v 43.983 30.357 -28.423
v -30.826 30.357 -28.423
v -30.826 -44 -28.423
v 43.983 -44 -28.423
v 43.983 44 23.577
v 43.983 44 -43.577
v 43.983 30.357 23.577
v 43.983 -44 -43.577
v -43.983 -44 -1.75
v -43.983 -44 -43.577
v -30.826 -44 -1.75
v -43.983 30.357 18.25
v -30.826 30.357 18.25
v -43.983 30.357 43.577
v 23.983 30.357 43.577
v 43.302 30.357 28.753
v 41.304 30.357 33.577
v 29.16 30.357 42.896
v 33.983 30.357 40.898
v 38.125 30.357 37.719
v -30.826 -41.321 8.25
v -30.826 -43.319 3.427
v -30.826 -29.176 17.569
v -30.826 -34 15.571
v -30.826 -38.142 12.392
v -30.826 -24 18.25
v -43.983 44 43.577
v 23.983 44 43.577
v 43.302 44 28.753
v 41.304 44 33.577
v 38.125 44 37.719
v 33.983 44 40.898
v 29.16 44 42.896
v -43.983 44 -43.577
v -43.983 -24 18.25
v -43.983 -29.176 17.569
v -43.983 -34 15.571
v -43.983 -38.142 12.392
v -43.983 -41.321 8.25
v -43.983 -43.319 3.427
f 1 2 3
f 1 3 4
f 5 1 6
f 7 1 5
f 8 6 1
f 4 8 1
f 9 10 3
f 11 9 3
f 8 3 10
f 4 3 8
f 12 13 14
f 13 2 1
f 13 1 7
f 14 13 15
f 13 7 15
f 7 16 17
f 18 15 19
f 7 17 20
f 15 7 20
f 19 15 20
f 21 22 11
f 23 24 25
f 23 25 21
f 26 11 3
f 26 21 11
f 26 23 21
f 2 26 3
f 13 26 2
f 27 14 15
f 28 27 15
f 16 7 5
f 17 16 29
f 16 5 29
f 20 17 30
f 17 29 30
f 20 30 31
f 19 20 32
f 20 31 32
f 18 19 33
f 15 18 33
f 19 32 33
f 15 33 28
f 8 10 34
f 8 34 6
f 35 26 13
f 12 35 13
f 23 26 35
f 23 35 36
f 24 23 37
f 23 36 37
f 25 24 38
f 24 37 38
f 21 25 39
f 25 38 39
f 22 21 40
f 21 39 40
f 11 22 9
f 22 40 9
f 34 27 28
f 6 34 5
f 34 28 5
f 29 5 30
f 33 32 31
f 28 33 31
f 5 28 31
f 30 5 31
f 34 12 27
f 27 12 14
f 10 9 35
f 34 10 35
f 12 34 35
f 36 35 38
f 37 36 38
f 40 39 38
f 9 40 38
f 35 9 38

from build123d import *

# Parameters (mm, degrees)
F0_W     = 87.9665389657
F0_H     = 87.1540307999
F1_DEPTH = 44
F2_W     = 74.8088378459
F2_H     = 74.356541276
F3_DEPTH = 72
F4_W     = 74.356541276
F4_H     = 25.3268238157
F5_DEPTH = 13.1587011198
F6_R     = 20


with BuildPart() as f1:
    # F0 (on Front) → F1 (new body, symmetric)
    with BuildSketch(Plane.XZ):
        Rectangle(F0_W, F0_H)
    extrude(amount=F1_DEPTH, both=True)

    # F2 (on face) → F3 (cut)
    with BuildSketch(Plane.XY.offset(43.5770153999)):
        with Locations((6.5788505599, -6.821729362)):
            Rectangle(F2_W, F2_H)
    extrude(amount=-F3_DEPTH, mode=Mode.SUBTRACT)

    # F4 (on face) → F5 (cut, through all)
    with BuildSketch(Plane.YZ.offset(-30.8255683631)):
        with Locations((-6.821729362, 30.9136034921)):
            Rectangle(F4_W, F4_H)
    extrude(amount=-F5_DEPTH, mode=Mode.SUBTRACT)

    # F6
    f6_edges = [f1.edges().sort_by_distance(p)[0] for p in [
        (43.983269, 37.178271, 43.577015),
        (-37.404419, -44, 18.250192),
    ]]
    fillet(f6_edges, radius=F6_R)


solid = f1.part
